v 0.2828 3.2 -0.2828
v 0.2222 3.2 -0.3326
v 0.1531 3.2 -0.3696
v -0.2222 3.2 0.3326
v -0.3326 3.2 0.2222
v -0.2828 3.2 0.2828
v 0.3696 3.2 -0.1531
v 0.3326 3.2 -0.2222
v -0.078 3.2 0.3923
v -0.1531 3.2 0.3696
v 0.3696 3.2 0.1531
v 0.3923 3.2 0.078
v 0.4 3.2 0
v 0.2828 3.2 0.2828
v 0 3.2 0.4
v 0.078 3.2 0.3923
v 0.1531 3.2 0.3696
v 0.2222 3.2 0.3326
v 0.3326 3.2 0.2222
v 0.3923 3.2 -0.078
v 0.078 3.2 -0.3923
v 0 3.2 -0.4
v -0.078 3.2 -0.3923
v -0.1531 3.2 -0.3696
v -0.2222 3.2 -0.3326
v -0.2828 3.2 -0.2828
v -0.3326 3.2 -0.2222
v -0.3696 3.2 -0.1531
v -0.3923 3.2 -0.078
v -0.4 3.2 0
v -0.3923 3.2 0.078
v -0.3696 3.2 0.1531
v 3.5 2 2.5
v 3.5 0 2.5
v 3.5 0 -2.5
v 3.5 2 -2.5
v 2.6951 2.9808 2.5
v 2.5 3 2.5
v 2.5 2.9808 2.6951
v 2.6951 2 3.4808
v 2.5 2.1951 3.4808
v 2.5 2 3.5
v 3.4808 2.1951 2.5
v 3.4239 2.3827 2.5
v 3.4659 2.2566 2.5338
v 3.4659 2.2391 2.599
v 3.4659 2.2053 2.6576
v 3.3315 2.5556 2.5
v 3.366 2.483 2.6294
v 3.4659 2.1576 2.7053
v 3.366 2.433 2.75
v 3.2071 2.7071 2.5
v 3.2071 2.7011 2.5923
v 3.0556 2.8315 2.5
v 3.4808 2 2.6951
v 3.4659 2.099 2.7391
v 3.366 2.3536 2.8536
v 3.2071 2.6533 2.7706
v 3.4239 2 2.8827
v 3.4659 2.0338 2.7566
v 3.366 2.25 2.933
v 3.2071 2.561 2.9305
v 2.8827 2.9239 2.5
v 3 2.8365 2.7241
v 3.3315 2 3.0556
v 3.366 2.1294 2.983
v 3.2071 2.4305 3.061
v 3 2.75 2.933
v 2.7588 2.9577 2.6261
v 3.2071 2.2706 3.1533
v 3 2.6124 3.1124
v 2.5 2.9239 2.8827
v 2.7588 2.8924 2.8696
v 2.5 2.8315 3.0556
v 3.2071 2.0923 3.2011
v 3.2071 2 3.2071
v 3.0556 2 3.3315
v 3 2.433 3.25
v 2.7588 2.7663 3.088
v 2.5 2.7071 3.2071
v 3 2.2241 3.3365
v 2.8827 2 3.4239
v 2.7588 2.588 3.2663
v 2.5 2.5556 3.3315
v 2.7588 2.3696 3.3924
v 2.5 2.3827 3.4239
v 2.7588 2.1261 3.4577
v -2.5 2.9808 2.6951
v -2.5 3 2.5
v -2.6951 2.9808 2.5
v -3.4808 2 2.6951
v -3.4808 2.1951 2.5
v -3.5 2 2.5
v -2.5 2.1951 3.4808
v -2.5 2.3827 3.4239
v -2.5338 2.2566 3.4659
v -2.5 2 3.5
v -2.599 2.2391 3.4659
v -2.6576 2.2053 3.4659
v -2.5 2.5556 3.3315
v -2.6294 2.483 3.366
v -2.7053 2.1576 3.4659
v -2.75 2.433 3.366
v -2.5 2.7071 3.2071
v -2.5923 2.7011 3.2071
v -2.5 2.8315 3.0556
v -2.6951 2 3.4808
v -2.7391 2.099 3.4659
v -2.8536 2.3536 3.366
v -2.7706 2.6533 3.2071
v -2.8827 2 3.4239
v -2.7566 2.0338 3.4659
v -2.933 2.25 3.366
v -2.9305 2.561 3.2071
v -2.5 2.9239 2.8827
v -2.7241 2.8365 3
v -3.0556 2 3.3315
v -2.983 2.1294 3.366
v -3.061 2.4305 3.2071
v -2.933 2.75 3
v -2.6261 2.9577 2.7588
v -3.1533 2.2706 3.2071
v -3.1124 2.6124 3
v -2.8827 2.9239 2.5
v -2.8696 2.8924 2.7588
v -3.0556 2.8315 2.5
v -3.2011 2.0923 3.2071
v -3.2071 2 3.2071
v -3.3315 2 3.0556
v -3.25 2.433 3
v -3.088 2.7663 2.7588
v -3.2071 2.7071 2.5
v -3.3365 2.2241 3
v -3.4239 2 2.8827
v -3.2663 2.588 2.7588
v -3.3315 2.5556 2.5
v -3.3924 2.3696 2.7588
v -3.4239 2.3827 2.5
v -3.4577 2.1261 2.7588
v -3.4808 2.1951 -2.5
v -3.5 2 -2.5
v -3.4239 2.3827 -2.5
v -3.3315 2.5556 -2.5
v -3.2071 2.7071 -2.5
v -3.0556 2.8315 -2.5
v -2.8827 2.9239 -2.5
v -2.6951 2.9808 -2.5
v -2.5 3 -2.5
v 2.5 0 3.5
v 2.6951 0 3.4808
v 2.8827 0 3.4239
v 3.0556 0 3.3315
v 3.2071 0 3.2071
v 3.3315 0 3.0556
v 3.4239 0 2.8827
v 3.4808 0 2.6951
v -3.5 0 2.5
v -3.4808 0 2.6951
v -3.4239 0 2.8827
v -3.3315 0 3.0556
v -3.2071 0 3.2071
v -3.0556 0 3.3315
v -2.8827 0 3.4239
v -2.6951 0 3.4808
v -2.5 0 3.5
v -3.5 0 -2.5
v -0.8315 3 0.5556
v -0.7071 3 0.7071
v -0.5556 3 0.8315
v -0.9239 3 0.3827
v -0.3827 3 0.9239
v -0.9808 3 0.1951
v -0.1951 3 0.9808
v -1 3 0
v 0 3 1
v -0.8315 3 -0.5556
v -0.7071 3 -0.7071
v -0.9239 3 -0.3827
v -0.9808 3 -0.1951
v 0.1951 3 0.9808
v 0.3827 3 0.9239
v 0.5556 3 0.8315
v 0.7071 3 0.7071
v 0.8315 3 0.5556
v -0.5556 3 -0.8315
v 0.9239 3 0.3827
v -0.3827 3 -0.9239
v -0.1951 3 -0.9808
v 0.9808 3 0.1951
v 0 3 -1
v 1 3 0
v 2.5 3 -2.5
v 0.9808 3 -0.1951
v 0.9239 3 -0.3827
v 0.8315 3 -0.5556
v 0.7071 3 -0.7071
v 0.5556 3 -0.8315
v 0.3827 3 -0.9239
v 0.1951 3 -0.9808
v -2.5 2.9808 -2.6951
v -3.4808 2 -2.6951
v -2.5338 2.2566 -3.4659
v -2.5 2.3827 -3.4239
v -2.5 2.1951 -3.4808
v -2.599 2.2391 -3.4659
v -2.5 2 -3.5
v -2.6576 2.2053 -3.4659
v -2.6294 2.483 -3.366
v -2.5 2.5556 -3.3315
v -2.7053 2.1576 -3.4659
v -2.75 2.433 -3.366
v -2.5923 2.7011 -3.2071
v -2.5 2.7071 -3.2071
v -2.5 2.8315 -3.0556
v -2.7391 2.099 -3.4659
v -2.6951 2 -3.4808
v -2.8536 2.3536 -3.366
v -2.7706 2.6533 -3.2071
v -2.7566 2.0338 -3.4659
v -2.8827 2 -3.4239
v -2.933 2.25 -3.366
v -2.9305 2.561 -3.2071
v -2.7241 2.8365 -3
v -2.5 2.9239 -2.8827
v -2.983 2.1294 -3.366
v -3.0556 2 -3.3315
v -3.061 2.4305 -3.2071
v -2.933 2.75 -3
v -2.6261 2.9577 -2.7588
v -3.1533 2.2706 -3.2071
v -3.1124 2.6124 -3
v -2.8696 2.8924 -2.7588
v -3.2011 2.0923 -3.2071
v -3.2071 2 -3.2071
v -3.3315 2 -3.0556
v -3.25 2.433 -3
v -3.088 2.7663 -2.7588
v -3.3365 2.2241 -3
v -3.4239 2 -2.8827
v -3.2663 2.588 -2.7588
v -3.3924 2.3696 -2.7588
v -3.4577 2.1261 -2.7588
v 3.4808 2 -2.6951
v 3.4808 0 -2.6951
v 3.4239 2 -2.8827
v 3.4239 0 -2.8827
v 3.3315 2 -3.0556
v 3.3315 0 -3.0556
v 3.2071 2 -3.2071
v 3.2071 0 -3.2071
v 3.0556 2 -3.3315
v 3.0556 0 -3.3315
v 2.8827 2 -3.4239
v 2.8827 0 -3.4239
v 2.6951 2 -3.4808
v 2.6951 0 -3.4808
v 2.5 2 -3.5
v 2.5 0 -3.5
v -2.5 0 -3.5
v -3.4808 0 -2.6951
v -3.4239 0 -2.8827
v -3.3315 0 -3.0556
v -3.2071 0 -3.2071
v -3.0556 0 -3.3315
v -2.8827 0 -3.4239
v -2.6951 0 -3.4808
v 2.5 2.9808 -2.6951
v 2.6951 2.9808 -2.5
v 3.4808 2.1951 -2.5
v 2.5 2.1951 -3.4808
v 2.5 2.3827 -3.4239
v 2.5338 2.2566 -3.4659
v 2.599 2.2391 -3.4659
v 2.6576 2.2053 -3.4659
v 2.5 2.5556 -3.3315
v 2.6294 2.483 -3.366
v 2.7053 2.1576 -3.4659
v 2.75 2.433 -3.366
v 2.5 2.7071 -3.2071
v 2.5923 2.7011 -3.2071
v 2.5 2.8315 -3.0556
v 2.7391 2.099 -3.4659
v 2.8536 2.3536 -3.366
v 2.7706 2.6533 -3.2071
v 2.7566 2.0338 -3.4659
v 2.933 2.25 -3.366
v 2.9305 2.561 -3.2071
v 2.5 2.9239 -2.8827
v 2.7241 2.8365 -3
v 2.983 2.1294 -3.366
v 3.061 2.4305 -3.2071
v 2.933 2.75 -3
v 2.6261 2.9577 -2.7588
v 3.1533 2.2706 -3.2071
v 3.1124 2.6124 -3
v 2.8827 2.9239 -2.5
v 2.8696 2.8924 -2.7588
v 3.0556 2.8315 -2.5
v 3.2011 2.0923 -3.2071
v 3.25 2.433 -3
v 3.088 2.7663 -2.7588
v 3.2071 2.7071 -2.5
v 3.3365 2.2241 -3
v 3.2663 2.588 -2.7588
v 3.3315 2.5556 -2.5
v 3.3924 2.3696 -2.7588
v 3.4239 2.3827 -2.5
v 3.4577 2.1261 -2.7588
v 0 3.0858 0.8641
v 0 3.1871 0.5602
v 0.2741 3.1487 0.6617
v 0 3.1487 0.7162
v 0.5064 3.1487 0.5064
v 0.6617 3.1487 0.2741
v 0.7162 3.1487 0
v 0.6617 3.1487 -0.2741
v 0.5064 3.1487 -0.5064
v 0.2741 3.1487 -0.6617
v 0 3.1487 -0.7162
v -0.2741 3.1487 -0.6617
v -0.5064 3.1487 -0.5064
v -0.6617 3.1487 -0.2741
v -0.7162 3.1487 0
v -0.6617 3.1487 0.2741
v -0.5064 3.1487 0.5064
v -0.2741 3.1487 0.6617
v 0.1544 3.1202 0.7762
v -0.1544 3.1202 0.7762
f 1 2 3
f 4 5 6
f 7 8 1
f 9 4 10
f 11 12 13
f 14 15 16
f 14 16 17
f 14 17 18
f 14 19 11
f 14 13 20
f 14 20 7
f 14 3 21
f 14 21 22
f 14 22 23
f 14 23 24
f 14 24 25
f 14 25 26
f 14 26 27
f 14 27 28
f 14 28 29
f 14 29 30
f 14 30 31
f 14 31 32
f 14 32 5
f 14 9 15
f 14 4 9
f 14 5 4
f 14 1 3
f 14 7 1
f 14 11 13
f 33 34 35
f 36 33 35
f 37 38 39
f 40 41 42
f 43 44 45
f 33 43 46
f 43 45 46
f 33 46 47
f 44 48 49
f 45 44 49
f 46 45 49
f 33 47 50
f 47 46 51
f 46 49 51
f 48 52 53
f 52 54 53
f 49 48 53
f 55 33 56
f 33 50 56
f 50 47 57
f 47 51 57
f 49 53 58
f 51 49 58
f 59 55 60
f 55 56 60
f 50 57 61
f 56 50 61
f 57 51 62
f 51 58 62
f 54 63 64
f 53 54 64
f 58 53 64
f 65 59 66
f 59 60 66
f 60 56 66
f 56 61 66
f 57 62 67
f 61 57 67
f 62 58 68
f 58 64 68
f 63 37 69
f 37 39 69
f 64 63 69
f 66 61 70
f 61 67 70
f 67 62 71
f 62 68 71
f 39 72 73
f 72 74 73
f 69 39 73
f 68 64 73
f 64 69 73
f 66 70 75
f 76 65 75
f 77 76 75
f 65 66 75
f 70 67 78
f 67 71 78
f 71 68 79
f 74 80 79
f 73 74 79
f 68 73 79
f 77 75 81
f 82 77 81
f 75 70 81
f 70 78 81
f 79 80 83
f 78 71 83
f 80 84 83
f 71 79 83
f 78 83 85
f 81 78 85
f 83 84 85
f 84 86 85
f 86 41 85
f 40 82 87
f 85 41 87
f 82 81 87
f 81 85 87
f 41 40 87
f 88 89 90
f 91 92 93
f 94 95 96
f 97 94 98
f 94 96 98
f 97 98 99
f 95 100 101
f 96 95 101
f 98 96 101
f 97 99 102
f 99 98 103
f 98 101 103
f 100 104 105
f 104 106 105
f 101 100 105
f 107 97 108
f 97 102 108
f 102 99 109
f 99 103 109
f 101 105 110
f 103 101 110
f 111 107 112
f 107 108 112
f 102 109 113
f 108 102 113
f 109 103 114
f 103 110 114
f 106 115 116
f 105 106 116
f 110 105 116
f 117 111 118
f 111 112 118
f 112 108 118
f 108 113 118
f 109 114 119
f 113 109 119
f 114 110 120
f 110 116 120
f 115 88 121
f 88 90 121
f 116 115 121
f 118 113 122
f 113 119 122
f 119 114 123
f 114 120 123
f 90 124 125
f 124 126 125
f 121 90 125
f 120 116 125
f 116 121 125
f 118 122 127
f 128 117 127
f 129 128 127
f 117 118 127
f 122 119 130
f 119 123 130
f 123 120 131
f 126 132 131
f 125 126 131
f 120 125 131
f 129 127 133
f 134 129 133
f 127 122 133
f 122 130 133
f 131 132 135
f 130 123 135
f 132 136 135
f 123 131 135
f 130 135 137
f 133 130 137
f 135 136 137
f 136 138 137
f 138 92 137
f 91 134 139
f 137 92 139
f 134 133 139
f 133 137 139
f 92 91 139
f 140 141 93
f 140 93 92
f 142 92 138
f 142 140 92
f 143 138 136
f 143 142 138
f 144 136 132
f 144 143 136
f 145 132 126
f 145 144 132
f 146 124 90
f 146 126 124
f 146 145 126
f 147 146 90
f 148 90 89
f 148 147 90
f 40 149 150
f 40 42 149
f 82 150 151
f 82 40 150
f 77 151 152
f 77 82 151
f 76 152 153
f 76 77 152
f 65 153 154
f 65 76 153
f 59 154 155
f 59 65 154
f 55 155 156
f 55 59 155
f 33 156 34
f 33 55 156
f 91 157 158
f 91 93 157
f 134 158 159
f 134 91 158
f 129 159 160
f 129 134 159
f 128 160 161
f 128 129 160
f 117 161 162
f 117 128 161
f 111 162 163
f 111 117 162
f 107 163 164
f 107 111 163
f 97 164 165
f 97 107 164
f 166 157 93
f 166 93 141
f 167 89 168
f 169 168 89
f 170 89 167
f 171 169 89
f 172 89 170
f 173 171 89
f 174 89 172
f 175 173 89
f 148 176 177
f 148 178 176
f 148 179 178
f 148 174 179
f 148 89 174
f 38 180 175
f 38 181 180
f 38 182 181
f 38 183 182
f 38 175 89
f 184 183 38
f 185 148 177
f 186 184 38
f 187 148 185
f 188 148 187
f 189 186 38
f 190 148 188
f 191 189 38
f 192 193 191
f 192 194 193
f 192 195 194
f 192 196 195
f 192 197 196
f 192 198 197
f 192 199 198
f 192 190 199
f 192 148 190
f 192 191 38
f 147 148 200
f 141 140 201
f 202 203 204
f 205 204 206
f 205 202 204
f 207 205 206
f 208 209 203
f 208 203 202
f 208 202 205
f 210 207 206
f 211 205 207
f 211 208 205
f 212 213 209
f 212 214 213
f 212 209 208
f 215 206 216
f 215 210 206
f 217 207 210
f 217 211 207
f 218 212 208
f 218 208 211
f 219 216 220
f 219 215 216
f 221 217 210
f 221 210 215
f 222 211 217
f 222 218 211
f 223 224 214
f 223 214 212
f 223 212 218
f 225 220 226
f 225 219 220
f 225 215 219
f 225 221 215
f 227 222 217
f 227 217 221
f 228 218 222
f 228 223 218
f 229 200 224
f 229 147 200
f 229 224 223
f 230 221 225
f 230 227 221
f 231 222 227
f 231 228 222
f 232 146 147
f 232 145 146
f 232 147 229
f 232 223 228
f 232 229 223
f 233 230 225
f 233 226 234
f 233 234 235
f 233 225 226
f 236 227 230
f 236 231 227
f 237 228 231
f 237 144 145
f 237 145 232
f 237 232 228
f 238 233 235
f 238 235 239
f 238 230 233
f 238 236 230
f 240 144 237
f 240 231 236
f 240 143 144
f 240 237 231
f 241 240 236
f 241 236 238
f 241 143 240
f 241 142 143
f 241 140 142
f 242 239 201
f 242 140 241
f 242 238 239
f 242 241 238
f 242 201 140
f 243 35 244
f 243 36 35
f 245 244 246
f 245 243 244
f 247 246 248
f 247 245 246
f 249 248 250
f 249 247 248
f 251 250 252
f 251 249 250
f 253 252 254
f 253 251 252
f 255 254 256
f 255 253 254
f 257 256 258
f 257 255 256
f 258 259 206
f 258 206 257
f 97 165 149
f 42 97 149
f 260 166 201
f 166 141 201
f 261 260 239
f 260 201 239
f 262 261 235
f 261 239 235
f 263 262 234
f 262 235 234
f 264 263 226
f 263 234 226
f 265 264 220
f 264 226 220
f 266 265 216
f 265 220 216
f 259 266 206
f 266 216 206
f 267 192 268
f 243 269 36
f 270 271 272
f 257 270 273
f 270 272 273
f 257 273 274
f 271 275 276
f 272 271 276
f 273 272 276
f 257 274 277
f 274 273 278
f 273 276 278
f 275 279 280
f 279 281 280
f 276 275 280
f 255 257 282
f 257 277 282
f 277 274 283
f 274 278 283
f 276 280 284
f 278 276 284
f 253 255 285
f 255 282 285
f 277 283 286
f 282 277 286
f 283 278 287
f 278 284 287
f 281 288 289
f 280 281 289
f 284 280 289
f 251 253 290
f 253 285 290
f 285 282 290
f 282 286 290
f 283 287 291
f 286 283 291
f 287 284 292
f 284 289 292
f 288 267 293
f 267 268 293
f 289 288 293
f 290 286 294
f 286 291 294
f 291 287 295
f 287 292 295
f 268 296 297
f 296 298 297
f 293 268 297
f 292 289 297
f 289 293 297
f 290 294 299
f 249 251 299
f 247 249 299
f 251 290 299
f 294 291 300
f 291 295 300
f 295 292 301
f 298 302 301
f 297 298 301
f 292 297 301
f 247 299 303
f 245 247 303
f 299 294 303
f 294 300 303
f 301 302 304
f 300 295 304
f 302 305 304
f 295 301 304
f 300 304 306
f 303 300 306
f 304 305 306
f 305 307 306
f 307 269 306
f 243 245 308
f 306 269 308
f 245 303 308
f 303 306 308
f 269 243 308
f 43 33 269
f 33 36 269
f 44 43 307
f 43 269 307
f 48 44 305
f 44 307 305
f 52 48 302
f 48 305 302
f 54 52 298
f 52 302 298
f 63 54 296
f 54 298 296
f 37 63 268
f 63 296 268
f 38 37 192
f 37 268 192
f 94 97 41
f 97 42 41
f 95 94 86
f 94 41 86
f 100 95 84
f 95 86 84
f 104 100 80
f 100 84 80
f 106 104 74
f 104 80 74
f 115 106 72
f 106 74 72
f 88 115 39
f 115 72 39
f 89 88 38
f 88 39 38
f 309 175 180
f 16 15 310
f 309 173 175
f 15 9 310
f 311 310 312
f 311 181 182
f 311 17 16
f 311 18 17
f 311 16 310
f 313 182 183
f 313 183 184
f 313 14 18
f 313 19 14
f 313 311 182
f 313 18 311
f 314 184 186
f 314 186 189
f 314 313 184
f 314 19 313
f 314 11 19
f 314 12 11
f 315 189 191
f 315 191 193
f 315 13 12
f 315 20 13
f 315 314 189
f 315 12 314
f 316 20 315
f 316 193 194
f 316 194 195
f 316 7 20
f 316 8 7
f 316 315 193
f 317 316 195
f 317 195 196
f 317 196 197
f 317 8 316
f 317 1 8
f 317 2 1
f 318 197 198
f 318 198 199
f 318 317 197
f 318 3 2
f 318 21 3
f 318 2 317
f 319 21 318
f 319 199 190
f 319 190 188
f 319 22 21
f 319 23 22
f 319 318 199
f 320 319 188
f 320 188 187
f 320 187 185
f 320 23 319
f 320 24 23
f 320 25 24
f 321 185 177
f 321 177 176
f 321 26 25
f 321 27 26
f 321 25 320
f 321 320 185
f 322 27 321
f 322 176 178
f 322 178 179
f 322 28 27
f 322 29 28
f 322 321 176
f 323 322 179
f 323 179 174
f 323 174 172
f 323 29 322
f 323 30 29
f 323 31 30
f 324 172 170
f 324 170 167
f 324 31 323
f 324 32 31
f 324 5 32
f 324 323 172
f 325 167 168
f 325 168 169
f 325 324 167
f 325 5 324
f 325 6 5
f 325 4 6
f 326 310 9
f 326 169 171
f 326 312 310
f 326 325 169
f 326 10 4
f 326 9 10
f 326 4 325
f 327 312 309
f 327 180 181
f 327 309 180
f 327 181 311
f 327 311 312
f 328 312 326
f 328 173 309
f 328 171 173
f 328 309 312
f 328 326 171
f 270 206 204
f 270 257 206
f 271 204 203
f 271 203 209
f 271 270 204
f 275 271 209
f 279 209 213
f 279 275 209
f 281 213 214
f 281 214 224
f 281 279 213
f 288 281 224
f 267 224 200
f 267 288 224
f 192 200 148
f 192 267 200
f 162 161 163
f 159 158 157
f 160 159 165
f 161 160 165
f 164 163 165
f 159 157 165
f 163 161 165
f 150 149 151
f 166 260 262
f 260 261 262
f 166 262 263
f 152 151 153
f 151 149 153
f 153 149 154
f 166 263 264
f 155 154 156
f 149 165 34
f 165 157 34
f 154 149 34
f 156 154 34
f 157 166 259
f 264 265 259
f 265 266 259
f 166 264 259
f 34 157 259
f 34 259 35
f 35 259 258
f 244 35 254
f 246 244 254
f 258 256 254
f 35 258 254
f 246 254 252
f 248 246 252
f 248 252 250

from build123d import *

# Parameters (mm, degrees)
SKETCH1_W           = 7
SKETCH1_H           = 7
BOSS_EXTRUDE1_DEPTH = 3
FILLET1_R           = 1
SKETCH2_R           = 1
BOSS_EXTRUDE2_DEPTH = 0.2
FILLET2_R           = 1


with BuildPart() as part:
    # Sketch1 → Boss-Extrude1 (new body)
    with BuildSketch(Plane(origin=(0, 0, 0), x_dir=(1, 0, 0), z_dir=(0, 1, 0))):
        Rectangle(SKETCH1_W, SKETCH1_H)
    extrude(amount=BOSS_EXTRUDE1_DEPTH)

    # Fillet1
    fillet1_edges = [part.edges().sort_by_distance(p)[0] for p in [
        (-3.5, 3, 0),
        (0, 3, 3.5),
        (3.5, 3, 0),
        (0, 3, -3.5),
        (3.5, 1.5, 3.5),
        (-3.5, 1.5, 3.5),
        (-3.5, 1.5, -3.5),
        (3.5, 1.5, -3.5),
    ]]
    fillet(fillet1_edges, radius=FILLET1_R)

    # Sketch2 → Boss-Extrude2 (add)
    with BuildSketch(Plane(origin=(0, 3, 0), x_dir=(1, 0, 0), z_dir=(0, 1, 0))):
        with Locations(Location((0, 0, 0), (0, 0, 270))):
            Circle(SKETCH2_R)
    extrude(amount=BOSS_EXTRUDE2_DEPTH)

    # Fillet2
    # the kernel refuses this fillet: 1 mm, written as the material it takes off along each edge
    with BuildSketch(Plane(origin=(0, 3.2, 0), x_dir=(0, 0, 1), z_dir=(-1, 0, 0))) as fillet2_piece_1:
        with BuildLine():
            CenterArc((0.4, -1), FILLET2_R, 53.130102354, 36.869897646)
            Line((0.4, 0), (0.4, 0.02))
            Line((0.4, 0.02), (1, 0.02))
            Line((1, 0.02), (1.02, 0))
            ThreePointArc((1.02, 0), (1.02, -0.1), (1.012, -0.184))
            Line((1.012, -0.184), (1, -0.2))
        make_face()
    revolve(axis=Axis((0, 3.2, 0), (0, 1, 0)), mode=Mode.SUBTRACT)


solid = part.part
